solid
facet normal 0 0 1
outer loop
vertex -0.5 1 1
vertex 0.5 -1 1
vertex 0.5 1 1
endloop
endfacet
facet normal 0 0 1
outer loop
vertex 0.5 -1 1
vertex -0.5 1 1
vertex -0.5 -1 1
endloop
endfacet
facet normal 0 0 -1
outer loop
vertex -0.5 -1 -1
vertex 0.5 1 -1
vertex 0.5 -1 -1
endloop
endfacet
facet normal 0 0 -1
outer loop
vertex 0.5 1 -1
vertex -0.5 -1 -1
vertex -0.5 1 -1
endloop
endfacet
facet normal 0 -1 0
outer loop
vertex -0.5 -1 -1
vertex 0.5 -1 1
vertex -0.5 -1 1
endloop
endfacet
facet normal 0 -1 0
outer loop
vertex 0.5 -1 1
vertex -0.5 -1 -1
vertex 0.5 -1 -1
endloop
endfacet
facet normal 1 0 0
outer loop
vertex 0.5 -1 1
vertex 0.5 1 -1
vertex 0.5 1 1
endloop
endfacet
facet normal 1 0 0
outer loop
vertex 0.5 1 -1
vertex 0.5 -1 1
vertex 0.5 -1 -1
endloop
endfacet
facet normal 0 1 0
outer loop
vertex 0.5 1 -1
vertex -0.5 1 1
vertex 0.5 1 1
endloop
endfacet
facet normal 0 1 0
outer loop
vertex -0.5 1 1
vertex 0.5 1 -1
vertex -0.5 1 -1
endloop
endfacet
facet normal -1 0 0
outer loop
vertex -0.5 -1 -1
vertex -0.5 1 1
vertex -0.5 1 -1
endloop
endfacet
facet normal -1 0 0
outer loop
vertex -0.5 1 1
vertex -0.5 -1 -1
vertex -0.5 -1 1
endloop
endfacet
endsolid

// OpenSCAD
module mycube2(a,b) {
  module innercube(q1,q2){
    cube(size=[q1, q2, 2], center=true);
    }
  innercube(a,b);
}

module mycube1(a,b,c) {
  mycube2(a,b);
}

mycube1(1,2,3);
